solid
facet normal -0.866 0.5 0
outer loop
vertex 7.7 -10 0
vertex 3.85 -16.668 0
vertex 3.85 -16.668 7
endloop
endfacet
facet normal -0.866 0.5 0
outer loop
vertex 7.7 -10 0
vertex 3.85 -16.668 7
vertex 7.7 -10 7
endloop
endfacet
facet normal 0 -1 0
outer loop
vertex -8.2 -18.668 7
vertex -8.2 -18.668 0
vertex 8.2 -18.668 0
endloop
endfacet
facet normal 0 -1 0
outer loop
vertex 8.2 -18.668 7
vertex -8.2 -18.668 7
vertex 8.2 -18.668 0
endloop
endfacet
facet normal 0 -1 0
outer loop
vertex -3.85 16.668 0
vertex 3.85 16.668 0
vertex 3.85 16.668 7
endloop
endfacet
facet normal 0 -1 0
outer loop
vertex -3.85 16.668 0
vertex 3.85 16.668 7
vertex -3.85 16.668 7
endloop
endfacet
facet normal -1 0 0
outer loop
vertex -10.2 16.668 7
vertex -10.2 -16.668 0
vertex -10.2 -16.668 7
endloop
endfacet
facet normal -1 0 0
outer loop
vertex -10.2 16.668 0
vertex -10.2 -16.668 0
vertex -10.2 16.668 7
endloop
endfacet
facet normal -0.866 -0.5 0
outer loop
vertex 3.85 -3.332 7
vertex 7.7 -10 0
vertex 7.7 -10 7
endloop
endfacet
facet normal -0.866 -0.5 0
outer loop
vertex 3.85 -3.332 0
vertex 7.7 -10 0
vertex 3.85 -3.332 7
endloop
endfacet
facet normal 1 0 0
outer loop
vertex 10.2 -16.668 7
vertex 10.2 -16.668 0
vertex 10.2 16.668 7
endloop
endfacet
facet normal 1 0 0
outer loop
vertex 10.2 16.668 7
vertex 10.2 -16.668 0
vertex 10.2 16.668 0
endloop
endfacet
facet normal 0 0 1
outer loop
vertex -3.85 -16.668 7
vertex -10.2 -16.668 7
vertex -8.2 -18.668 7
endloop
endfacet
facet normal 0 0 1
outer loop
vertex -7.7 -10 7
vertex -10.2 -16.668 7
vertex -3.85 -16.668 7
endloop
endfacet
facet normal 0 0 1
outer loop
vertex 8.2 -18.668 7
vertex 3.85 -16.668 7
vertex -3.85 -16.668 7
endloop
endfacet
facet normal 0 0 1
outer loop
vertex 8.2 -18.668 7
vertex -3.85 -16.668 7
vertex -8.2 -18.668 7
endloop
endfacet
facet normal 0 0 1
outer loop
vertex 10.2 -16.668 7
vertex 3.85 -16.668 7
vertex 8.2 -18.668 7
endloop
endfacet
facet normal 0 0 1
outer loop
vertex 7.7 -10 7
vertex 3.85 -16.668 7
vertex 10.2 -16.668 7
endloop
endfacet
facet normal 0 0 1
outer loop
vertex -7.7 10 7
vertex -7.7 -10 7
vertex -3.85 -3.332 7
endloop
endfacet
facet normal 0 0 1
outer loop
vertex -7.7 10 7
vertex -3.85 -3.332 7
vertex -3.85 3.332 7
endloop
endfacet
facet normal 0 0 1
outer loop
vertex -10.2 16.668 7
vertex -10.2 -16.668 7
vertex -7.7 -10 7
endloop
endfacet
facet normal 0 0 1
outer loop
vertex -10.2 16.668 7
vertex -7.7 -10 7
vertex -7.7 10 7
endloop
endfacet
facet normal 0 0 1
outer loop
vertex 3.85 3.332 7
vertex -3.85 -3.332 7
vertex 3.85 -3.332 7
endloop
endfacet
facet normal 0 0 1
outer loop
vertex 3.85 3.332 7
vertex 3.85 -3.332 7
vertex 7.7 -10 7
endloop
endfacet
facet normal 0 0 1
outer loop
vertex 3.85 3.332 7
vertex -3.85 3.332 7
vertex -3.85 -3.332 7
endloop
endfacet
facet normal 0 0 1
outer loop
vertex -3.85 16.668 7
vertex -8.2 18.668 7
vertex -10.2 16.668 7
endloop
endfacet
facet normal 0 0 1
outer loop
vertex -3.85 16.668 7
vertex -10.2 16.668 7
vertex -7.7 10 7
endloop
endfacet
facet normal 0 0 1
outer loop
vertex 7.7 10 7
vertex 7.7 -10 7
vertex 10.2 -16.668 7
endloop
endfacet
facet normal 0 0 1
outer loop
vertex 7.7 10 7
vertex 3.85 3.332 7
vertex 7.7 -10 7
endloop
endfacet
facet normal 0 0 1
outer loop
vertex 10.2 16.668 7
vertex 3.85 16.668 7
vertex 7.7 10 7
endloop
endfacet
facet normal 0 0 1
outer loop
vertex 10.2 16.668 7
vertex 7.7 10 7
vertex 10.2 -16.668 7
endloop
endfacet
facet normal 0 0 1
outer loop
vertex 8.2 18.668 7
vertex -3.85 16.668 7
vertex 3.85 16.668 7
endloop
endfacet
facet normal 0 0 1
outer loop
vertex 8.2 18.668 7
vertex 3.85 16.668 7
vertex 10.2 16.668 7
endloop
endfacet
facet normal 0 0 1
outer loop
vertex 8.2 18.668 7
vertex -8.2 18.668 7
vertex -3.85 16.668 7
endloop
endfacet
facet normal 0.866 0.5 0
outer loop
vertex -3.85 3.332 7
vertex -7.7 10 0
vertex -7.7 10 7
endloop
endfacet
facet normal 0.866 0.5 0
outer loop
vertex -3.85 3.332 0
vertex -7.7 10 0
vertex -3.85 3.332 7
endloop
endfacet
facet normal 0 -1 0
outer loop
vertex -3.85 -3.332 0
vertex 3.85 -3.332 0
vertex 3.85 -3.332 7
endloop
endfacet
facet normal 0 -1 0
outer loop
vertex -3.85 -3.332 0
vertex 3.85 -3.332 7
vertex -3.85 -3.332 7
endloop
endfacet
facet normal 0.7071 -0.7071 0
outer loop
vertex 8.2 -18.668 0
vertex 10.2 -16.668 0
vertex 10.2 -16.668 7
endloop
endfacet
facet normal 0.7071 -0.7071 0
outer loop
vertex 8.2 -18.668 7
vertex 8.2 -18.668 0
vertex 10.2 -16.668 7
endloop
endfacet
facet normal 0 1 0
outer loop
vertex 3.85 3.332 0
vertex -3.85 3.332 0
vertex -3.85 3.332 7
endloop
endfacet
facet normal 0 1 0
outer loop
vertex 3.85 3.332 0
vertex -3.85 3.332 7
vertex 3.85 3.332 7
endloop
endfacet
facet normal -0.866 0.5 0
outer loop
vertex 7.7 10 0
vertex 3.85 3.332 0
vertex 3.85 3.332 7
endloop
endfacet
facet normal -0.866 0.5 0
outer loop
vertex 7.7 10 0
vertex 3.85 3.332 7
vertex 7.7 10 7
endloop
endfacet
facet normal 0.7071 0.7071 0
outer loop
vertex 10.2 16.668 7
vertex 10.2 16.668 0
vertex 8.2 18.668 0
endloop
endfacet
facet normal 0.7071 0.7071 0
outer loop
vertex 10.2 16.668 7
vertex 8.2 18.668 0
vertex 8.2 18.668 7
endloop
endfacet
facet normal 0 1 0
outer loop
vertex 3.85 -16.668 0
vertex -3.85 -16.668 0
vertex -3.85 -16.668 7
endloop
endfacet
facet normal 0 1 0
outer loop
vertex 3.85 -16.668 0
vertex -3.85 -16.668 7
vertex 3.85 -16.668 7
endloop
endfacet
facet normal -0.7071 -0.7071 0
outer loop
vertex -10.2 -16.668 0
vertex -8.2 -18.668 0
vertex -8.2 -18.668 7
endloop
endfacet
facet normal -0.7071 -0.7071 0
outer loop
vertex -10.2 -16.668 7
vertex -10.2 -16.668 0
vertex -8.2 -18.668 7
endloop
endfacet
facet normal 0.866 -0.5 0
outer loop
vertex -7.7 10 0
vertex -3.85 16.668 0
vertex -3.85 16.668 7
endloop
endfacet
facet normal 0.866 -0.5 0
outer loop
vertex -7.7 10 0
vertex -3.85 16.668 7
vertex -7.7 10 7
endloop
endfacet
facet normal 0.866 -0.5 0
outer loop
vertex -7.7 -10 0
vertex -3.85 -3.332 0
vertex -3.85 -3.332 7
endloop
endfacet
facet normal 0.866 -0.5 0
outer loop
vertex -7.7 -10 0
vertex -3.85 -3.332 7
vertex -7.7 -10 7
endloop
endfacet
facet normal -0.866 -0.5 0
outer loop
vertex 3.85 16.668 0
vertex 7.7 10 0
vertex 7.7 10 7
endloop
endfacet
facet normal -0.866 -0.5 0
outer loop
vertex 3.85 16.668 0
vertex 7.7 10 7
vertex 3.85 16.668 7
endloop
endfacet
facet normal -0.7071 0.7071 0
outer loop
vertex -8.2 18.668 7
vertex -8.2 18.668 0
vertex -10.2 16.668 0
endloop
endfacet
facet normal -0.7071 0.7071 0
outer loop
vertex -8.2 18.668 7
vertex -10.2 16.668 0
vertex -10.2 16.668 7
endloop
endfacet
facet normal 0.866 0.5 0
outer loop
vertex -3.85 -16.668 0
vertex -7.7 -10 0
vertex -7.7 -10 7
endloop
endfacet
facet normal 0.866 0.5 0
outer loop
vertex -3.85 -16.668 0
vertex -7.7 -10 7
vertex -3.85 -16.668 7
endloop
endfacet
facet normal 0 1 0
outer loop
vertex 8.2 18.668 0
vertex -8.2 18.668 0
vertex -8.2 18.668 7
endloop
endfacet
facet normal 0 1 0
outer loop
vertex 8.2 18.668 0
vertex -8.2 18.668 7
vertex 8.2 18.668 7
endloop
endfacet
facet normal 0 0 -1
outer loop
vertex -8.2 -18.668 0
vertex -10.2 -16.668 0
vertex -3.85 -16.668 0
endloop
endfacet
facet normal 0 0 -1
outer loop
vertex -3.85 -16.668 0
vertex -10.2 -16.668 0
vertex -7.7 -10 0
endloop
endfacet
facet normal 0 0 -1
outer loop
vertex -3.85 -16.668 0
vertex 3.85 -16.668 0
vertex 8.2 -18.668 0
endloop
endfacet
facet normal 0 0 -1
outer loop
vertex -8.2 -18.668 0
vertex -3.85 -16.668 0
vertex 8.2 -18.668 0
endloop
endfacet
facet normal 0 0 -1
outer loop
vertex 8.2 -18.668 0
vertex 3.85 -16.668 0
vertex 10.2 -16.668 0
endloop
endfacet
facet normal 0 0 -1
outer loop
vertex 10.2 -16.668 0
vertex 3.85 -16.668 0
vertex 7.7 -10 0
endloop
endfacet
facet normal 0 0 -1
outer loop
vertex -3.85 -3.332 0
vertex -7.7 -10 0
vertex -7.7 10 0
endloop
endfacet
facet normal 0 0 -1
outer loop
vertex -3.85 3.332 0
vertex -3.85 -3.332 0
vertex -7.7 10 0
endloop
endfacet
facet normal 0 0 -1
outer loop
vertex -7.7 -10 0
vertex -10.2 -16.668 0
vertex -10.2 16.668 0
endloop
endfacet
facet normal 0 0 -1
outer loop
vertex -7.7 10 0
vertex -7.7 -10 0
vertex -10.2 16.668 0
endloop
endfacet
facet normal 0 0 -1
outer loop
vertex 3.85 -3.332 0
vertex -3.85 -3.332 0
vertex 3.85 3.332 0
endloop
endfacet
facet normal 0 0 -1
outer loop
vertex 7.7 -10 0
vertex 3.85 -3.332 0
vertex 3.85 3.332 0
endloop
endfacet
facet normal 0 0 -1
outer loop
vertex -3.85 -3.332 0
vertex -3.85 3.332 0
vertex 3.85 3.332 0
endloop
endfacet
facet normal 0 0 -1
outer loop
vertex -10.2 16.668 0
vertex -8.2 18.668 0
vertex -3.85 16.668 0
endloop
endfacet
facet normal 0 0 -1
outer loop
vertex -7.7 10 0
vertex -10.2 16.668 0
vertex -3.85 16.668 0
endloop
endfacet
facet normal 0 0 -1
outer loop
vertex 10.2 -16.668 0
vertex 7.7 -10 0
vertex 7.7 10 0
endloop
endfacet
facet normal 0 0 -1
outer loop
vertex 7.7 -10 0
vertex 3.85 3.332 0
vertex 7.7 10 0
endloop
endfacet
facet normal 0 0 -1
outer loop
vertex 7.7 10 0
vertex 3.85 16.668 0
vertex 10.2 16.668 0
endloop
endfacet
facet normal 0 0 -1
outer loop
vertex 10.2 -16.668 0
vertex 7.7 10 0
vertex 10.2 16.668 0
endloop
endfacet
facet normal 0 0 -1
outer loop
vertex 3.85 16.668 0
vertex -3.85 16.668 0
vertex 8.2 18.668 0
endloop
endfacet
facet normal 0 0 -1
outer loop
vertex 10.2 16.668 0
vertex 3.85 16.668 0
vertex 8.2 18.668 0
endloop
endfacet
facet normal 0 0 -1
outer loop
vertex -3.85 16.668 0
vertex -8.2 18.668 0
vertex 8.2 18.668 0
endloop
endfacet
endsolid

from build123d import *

# Parameters (mm, degrees)
SKETCH_W     = 20.4
SKETCH_H     = 37.336792
PAD_DEPTH    = 7
CHAMFER_SIZE = 2


with BuildPart() as part:
    # Sketch → Pad (new body)
    with BuildSketch(Plane.XY):
        Rectangle(SKETCH_W, SKETCH_H)
        Polygon((3.85, 16.668396), (-3.85, 16.668396), (-7.7, 10), (-3.85, 3.331604), (3.85, 3.331604), (7.7, 10), align=None, mode=Mode.SUBTRACT)
        Polygon((3.85, -3.331604), (-3.85, -3.331604), (-7.7, -10), (-3.85, -16.668396), (3.85, -16.668396), (7.7, -10), align=None, mode=Mode.SUBTRACT)
    extrude(amount=PAD_DEPTH)

    # Chamfer
    chamfer_edges = [part.edges().sort_by_distance(p)[0] for p in [
        (10.2, 18.668396, 3.5),
        (-10.2, 18.668396, 3.5),
        (10.2, -18.668396, 3.5),
        (-10.2, -18.668396, 3.5),
    ]]
    chamfer(chamfer_edges, length=CHAMFER_SIZE)


solid = part.part
